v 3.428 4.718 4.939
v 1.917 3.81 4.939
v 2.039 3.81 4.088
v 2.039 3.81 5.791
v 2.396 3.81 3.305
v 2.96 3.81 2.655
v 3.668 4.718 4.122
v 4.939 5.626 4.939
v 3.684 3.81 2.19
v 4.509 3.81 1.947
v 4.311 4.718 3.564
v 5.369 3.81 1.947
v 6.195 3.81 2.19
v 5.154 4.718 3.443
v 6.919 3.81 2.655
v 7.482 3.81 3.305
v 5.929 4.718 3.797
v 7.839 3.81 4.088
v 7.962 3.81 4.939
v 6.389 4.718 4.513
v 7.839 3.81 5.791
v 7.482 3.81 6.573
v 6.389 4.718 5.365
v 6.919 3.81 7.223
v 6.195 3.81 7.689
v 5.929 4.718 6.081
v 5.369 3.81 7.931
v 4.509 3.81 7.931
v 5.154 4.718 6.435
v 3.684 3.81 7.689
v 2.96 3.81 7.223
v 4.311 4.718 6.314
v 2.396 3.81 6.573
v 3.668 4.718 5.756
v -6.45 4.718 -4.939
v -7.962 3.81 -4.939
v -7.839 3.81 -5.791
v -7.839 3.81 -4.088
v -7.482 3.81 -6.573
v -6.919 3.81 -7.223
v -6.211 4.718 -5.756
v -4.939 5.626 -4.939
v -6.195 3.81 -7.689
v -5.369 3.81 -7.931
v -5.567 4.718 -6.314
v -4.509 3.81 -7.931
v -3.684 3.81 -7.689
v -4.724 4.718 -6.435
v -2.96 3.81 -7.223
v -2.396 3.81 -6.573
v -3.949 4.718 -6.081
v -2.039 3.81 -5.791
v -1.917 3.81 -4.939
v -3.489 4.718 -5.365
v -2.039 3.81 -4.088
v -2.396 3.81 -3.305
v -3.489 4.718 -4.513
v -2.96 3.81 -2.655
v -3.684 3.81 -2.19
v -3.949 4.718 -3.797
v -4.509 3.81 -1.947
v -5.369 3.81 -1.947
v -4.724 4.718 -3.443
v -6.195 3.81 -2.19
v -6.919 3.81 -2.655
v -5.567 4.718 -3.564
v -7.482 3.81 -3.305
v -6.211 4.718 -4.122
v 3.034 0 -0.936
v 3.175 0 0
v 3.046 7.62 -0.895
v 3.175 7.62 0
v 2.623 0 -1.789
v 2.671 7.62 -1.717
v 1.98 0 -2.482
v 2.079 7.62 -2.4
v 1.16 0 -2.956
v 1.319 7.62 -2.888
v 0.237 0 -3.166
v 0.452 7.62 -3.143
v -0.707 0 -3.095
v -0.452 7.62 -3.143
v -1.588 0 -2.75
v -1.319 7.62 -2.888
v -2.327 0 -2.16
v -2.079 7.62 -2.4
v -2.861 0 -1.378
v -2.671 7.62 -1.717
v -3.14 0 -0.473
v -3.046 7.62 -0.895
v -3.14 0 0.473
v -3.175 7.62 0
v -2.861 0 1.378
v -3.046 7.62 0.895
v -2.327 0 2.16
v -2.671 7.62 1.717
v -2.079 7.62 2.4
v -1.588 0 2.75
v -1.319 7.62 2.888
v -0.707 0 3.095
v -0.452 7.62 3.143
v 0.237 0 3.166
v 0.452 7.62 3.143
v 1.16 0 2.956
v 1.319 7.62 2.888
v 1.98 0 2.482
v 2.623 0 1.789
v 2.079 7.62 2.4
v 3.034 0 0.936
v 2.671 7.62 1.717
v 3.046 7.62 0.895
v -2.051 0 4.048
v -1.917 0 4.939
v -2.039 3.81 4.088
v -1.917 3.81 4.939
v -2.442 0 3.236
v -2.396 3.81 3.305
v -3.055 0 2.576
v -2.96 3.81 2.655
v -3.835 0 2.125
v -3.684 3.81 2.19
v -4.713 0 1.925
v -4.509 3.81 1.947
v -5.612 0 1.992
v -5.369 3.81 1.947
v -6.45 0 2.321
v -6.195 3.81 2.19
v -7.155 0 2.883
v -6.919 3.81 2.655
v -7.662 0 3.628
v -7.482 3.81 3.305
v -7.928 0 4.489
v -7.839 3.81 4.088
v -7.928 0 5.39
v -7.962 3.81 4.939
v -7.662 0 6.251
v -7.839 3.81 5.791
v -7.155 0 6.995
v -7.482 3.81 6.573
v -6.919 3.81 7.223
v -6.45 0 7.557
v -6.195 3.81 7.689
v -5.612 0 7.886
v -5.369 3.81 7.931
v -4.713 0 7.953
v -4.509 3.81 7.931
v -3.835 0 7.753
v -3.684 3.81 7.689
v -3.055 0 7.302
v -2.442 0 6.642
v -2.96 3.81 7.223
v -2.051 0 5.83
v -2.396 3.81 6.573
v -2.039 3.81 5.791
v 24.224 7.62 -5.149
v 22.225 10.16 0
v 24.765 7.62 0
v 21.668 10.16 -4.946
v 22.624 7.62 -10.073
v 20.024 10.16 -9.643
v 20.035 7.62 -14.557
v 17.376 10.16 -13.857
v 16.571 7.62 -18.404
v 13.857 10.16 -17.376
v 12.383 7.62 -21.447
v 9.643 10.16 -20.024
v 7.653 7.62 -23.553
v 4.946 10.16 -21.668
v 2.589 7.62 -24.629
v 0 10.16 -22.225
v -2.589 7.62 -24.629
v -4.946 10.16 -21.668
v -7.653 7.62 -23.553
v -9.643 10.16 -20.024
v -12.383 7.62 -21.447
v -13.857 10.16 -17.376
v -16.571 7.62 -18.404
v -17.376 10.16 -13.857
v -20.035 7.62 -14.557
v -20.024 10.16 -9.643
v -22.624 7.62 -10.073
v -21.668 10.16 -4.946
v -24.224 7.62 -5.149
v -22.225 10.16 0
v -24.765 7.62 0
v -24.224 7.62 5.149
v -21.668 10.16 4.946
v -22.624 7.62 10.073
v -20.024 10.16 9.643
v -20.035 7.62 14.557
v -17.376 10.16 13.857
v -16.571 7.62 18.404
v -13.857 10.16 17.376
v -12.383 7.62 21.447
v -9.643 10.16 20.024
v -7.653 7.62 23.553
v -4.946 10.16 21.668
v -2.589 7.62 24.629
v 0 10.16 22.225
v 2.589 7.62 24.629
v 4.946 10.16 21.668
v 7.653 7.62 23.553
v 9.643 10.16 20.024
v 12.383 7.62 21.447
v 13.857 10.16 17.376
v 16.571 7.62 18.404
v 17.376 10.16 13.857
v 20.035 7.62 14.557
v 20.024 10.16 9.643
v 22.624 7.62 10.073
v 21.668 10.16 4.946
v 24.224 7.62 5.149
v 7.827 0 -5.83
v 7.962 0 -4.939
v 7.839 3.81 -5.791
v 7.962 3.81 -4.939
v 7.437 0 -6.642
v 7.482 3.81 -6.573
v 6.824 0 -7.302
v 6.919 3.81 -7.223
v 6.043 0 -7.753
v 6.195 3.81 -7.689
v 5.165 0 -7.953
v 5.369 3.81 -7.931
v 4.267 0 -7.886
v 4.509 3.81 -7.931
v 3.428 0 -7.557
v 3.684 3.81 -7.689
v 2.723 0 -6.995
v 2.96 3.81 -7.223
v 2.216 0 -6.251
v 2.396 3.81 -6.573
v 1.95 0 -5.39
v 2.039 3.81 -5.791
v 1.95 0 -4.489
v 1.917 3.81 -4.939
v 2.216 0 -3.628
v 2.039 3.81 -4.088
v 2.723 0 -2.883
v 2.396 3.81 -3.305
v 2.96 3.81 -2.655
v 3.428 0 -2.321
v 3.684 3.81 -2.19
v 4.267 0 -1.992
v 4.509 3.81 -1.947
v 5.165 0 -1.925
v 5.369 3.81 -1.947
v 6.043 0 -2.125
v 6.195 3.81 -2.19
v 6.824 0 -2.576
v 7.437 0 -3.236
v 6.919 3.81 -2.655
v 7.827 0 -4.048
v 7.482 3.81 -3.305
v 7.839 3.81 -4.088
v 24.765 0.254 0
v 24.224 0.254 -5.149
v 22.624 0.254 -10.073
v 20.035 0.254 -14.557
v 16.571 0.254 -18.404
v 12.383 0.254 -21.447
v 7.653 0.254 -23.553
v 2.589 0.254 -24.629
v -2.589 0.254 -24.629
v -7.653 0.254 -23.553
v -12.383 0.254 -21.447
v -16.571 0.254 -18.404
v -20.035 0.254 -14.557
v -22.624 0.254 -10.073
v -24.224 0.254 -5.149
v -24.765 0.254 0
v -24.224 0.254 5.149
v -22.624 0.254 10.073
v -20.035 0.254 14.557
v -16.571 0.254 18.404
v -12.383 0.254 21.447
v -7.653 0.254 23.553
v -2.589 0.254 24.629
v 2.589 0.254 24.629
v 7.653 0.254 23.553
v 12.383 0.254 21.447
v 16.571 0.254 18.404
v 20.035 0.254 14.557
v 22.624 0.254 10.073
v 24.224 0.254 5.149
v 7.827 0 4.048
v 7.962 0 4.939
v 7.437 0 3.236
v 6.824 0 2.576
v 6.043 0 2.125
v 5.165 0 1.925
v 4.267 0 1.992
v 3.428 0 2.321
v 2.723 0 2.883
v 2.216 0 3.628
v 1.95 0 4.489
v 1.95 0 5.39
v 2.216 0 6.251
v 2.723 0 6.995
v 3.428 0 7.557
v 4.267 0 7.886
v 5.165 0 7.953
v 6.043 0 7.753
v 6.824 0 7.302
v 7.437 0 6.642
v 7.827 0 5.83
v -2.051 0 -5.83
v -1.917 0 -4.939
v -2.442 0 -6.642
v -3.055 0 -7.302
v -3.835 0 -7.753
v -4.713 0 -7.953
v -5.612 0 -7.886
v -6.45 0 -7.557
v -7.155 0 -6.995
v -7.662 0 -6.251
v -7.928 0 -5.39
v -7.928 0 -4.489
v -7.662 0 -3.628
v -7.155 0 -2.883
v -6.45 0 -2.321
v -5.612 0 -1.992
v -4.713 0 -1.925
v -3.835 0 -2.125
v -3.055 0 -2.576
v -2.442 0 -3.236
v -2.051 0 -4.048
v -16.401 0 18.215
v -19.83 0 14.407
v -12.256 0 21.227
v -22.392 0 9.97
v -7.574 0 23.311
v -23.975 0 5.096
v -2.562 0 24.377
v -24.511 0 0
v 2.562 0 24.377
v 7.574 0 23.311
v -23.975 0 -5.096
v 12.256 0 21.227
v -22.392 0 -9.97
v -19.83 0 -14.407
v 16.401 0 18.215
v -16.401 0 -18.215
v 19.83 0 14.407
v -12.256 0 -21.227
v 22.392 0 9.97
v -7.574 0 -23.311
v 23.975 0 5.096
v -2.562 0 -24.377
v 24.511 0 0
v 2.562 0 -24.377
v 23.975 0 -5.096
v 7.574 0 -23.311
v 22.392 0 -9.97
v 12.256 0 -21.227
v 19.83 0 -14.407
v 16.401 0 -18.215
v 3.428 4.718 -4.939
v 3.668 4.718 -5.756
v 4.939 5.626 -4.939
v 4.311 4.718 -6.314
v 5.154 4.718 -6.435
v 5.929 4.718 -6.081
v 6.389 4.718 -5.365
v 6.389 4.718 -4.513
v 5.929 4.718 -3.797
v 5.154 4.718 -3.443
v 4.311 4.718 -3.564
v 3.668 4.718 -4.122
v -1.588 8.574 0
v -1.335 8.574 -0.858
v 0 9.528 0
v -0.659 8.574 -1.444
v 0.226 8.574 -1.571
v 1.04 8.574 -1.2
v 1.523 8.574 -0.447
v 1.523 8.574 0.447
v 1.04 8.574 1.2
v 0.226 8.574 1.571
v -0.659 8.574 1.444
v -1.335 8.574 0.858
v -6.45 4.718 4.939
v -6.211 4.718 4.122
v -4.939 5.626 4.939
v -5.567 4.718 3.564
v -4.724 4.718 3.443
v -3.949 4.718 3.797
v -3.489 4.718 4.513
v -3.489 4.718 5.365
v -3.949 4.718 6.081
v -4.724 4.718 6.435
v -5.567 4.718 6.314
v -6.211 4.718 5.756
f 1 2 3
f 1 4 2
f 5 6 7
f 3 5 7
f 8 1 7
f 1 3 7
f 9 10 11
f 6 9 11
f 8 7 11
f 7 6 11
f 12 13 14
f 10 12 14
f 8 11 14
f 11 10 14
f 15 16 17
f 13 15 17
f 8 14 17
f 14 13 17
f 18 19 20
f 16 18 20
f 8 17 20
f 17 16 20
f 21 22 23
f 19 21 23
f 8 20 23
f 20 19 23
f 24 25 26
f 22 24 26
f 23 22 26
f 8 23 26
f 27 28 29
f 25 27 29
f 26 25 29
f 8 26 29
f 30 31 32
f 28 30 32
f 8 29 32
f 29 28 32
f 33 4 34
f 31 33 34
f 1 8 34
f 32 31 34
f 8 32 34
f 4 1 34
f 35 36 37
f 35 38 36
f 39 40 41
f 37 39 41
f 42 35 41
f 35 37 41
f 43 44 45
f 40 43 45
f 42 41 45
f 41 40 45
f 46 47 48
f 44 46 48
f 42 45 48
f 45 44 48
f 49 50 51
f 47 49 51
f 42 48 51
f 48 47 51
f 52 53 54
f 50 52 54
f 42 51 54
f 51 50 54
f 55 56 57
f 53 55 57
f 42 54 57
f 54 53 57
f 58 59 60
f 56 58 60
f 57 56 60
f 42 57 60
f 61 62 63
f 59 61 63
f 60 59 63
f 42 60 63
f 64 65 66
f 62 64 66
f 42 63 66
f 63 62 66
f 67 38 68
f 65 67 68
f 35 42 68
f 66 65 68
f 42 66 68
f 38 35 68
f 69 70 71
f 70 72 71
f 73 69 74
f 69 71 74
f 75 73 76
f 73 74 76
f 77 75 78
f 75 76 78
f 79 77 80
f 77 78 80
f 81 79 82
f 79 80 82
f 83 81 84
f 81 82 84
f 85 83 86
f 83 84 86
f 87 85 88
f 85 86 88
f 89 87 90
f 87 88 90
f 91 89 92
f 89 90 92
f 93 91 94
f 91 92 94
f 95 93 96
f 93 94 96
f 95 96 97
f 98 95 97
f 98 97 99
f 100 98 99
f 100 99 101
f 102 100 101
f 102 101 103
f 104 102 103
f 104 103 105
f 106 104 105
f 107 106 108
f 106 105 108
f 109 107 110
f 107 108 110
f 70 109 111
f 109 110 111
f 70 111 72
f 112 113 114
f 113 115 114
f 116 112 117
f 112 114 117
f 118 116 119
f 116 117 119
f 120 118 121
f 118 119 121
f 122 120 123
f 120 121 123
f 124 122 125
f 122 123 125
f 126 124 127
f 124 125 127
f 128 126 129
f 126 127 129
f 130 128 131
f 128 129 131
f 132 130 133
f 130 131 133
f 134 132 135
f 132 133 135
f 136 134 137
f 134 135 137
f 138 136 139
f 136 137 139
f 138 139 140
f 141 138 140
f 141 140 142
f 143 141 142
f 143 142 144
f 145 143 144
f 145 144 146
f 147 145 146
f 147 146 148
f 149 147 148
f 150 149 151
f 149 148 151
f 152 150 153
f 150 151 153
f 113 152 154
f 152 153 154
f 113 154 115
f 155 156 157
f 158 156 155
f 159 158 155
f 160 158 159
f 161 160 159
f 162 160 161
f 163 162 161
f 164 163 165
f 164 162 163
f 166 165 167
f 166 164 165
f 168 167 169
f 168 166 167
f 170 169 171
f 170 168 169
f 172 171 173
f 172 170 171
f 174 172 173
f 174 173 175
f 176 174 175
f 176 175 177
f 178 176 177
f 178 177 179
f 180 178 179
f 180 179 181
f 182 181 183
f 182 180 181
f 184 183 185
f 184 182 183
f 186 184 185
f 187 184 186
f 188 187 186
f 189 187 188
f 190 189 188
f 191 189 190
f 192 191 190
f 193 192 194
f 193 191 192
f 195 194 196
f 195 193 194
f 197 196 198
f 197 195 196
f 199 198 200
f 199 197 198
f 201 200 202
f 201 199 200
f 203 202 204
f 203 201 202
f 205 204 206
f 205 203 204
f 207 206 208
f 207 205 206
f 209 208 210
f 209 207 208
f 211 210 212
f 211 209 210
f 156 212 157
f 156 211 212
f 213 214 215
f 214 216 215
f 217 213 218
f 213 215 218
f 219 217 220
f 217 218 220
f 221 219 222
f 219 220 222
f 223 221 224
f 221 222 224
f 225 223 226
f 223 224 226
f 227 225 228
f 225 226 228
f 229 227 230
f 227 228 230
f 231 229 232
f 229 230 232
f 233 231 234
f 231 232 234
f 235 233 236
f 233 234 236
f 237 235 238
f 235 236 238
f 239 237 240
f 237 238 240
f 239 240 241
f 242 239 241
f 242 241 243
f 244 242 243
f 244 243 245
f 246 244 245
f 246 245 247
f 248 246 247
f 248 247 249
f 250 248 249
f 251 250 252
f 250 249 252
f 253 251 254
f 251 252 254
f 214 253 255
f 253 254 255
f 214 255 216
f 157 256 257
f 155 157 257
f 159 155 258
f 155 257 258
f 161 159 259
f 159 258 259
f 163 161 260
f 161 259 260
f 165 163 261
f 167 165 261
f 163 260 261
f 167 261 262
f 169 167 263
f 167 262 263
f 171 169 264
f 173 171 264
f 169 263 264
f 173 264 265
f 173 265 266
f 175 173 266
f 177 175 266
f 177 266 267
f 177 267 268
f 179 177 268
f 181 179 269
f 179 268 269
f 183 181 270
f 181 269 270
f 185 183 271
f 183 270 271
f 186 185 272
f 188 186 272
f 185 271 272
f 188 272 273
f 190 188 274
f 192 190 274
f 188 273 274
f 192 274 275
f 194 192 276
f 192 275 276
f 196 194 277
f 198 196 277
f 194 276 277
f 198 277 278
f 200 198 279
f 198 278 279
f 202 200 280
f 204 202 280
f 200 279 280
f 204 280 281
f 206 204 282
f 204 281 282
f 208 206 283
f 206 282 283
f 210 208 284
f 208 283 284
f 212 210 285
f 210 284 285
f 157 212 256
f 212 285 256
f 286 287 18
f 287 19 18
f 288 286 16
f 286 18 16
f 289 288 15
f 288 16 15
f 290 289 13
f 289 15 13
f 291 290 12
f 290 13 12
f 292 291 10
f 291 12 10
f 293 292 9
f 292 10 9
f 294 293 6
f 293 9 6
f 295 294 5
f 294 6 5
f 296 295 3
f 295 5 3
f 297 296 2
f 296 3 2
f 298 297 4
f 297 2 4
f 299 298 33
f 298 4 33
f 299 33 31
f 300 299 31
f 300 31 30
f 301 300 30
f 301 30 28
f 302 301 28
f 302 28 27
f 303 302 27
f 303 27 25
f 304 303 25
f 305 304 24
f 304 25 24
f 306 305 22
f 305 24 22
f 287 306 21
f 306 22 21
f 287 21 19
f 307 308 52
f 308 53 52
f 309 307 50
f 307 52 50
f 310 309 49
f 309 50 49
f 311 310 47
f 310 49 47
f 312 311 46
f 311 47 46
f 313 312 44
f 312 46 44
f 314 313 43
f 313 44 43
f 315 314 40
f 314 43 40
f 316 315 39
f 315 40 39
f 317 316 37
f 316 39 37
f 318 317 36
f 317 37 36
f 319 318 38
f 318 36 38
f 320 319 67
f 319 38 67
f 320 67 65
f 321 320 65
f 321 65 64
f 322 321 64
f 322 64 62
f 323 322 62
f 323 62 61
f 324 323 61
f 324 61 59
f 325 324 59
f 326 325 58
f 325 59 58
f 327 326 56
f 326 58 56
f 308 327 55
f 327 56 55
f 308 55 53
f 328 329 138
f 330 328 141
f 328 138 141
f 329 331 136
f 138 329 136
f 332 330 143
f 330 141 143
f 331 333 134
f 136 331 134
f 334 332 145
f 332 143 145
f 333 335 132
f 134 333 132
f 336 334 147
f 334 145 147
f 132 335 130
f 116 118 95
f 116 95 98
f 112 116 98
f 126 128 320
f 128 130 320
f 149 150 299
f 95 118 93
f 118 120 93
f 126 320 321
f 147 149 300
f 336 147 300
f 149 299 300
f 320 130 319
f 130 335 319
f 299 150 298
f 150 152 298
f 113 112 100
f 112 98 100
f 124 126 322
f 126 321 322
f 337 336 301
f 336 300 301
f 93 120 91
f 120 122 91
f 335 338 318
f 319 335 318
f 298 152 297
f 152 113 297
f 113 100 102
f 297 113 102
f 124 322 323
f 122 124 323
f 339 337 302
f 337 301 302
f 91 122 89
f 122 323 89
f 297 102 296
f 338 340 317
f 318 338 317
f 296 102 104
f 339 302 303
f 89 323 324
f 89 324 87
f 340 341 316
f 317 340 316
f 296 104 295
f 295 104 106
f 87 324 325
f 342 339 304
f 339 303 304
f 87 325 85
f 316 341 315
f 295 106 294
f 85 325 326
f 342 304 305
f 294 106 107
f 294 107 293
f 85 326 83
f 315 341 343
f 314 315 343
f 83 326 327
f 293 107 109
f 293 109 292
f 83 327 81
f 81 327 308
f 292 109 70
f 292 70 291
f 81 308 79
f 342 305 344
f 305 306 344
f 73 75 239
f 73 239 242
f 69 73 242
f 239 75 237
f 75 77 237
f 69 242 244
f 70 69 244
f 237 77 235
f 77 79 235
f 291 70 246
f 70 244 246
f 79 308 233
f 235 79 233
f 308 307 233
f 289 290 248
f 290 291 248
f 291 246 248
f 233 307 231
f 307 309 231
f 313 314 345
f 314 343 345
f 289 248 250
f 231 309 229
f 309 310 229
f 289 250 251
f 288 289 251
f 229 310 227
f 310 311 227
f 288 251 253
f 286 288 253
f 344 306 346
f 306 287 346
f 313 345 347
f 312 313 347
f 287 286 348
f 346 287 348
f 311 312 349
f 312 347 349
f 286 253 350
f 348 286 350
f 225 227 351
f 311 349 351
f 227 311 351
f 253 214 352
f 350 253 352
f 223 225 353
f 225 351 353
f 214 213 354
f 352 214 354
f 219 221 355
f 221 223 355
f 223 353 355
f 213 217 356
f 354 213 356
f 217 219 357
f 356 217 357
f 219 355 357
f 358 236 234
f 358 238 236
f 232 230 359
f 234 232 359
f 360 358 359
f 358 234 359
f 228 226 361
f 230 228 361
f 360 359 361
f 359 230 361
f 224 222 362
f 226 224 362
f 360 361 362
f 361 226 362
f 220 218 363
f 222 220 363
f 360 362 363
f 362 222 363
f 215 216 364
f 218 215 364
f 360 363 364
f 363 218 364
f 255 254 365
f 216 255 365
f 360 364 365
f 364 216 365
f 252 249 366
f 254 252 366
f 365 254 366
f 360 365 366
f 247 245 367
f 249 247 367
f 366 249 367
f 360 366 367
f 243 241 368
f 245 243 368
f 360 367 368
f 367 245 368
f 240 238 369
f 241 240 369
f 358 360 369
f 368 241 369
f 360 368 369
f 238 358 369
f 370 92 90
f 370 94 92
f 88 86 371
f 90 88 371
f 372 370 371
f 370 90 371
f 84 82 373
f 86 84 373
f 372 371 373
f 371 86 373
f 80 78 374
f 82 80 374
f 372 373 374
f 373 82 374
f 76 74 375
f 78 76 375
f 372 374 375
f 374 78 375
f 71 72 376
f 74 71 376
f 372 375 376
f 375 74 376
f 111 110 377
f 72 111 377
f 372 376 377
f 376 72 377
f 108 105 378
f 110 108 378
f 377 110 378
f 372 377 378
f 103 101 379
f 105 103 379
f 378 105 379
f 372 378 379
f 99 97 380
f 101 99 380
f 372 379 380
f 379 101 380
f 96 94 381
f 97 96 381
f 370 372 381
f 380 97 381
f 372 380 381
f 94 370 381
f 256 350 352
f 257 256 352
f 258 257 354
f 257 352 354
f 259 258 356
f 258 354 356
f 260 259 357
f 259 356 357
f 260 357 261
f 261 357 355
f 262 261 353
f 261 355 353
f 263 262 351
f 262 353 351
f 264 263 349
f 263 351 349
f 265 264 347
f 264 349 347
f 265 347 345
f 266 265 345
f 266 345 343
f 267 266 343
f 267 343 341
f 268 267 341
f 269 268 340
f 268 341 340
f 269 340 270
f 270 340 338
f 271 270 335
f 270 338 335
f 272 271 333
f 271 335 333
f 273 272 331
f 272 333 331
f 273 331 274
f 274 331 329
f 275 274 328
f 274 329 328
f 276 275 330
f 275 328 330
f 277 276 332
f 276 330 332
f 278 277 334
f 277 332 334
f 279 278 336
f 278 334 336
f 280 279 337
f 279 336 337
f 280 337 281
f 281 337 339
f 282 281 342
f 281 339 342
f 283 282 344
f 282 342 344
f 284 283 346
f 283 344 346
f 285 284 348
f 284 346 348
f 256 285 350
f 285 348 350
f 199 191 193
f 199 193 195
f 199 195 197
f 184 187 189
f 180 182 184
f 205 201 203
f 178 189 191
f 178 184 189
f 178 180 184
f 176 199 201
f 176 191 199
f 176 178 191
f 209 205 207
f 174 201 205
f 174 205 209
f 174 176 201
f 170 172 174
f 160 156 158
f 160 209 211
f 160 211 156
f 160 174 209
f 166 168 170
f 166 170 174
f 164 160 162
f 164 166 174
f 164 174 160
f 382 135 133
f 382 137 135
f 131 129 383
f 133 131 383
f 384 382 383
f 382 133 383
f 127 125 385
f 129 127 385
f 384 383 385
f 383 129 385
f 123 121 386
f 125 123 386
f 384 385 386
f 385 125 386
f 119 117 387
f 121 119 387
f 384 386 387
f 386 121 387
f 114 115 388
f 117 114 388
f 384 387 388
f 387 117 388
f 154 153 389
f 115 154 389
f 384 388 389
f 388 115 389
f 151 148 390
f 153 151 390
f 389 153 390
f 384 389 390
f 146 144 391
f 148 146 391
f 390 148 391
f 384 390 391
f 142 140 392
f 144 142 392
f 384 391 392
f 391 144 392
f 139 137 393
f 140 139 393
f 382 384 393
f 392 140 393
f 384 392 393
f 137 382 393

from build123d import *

# Parameters (mm, degrees)
SKETCH2_R                       = 24.765
BOSS_EXTRUDE1_DEPTH             = 10.16
CHAMFER1_SIZE                   = 2.54
CHAMFER2_SIZE                   = 0.254
B_0_238_DIAMETER_HOLE1_D        = 6.0452
B_0_238_DIAMETER_HOLE1_DEPTH    = 3.81
B_0_238_DIAMETER_HOLE1_TIP      = 1.816161307
F_1_4_0_25_DIAMETER_HOLE1_D     = 6.35
F_1_4_0_25_DIAMETER_HOLE1_DEPTH = 7.62
F_1_4_0_25_DIAMETER_HOLE1_TIP   = 1.907732465


with BuildPart() as part:
    # Sketch2 → Boss-Extrude1 (new body)
    with BuildSketch(Plane(origin=(0, 0, 0), x_dir=(1, 0, 0), z_dir=(0, 1, 0))):
        Circle(SKETCH2_R)
    extrude(amount=BOSS_EXTRUDE1_DEPTH)

    # Chamfer1
    chamfer1_edges = [part.edges().sort_by_distance(p)[0] for p in [
        (-24.765, 10.16, 0),
    ]]
    chamfer(chamfer1_edges, length=CHAMFER1_SIZE)

    # Chamfer2
    chamfer2_edges = [part.edges().sort_by_distance(p)[0] for p in [
        (-24.765, 0, 0),
    ]]
    chamfer(chamfer2_edges, length=CHAMFER2_SIZE)

    # B (0.238) Diameter Hole1
    with Locations(Plane(origin=(0, 0, 0), x_dir=(-1, 0, 0), z_dir=(0, -1, 0))):
        with Locations((-4.939140867, 4.939140867), (4.939140867, 4.939140867), (4.939140867, -4.939140867), (-4.939140867, -4.939140867)):
            Hole(B_0_238_DIAMETER_HOLE1_D / 2, depth=B_0_238_DIAMETER_HOLE1_DEPTH)
            with Locations((0, 0, -(B_0_238_DIAMETER_HOLE1_DEPTH + B_0_238_DIAMETER_HOLE1_TIP / 2))):  # 118° drill point
                Cone(0, B_0_238_DIAMETER_HOLE1_D / 2, B_0_238_DIAMETER_HOLE1_TIP, mode=Mode.SUBTRACT)

    # 1/4 (0.25) Diameter Hole1
    with Locations(Plane(origin=(0, 0, 0), x_dir=(-1, 0, 0), z_dir=(0, -1, 0))):
        with Locations((0, 0)):
            Hole(F_1_4_0_25_DIAMETER_HOLE1_D / 2, depth=F_1_4_0_25_DIAMETER_HOLE1_DEPTH)
            with Locations((0, 0, -(F_1_4_0_25_DIAMETER_HOLE1_DEPTH + F_1_4_0_25_DIAMETER_HOLE1_TIP / 2))):  # 118° drill point
                Cone(0, F_1_4_0_25_DIAMETER_HOLE1_D / 2, F_1_4_0_25_DIAMETER_HOLE1_TIP, mode=Mode.SUBTRACT)


solid = part.part
